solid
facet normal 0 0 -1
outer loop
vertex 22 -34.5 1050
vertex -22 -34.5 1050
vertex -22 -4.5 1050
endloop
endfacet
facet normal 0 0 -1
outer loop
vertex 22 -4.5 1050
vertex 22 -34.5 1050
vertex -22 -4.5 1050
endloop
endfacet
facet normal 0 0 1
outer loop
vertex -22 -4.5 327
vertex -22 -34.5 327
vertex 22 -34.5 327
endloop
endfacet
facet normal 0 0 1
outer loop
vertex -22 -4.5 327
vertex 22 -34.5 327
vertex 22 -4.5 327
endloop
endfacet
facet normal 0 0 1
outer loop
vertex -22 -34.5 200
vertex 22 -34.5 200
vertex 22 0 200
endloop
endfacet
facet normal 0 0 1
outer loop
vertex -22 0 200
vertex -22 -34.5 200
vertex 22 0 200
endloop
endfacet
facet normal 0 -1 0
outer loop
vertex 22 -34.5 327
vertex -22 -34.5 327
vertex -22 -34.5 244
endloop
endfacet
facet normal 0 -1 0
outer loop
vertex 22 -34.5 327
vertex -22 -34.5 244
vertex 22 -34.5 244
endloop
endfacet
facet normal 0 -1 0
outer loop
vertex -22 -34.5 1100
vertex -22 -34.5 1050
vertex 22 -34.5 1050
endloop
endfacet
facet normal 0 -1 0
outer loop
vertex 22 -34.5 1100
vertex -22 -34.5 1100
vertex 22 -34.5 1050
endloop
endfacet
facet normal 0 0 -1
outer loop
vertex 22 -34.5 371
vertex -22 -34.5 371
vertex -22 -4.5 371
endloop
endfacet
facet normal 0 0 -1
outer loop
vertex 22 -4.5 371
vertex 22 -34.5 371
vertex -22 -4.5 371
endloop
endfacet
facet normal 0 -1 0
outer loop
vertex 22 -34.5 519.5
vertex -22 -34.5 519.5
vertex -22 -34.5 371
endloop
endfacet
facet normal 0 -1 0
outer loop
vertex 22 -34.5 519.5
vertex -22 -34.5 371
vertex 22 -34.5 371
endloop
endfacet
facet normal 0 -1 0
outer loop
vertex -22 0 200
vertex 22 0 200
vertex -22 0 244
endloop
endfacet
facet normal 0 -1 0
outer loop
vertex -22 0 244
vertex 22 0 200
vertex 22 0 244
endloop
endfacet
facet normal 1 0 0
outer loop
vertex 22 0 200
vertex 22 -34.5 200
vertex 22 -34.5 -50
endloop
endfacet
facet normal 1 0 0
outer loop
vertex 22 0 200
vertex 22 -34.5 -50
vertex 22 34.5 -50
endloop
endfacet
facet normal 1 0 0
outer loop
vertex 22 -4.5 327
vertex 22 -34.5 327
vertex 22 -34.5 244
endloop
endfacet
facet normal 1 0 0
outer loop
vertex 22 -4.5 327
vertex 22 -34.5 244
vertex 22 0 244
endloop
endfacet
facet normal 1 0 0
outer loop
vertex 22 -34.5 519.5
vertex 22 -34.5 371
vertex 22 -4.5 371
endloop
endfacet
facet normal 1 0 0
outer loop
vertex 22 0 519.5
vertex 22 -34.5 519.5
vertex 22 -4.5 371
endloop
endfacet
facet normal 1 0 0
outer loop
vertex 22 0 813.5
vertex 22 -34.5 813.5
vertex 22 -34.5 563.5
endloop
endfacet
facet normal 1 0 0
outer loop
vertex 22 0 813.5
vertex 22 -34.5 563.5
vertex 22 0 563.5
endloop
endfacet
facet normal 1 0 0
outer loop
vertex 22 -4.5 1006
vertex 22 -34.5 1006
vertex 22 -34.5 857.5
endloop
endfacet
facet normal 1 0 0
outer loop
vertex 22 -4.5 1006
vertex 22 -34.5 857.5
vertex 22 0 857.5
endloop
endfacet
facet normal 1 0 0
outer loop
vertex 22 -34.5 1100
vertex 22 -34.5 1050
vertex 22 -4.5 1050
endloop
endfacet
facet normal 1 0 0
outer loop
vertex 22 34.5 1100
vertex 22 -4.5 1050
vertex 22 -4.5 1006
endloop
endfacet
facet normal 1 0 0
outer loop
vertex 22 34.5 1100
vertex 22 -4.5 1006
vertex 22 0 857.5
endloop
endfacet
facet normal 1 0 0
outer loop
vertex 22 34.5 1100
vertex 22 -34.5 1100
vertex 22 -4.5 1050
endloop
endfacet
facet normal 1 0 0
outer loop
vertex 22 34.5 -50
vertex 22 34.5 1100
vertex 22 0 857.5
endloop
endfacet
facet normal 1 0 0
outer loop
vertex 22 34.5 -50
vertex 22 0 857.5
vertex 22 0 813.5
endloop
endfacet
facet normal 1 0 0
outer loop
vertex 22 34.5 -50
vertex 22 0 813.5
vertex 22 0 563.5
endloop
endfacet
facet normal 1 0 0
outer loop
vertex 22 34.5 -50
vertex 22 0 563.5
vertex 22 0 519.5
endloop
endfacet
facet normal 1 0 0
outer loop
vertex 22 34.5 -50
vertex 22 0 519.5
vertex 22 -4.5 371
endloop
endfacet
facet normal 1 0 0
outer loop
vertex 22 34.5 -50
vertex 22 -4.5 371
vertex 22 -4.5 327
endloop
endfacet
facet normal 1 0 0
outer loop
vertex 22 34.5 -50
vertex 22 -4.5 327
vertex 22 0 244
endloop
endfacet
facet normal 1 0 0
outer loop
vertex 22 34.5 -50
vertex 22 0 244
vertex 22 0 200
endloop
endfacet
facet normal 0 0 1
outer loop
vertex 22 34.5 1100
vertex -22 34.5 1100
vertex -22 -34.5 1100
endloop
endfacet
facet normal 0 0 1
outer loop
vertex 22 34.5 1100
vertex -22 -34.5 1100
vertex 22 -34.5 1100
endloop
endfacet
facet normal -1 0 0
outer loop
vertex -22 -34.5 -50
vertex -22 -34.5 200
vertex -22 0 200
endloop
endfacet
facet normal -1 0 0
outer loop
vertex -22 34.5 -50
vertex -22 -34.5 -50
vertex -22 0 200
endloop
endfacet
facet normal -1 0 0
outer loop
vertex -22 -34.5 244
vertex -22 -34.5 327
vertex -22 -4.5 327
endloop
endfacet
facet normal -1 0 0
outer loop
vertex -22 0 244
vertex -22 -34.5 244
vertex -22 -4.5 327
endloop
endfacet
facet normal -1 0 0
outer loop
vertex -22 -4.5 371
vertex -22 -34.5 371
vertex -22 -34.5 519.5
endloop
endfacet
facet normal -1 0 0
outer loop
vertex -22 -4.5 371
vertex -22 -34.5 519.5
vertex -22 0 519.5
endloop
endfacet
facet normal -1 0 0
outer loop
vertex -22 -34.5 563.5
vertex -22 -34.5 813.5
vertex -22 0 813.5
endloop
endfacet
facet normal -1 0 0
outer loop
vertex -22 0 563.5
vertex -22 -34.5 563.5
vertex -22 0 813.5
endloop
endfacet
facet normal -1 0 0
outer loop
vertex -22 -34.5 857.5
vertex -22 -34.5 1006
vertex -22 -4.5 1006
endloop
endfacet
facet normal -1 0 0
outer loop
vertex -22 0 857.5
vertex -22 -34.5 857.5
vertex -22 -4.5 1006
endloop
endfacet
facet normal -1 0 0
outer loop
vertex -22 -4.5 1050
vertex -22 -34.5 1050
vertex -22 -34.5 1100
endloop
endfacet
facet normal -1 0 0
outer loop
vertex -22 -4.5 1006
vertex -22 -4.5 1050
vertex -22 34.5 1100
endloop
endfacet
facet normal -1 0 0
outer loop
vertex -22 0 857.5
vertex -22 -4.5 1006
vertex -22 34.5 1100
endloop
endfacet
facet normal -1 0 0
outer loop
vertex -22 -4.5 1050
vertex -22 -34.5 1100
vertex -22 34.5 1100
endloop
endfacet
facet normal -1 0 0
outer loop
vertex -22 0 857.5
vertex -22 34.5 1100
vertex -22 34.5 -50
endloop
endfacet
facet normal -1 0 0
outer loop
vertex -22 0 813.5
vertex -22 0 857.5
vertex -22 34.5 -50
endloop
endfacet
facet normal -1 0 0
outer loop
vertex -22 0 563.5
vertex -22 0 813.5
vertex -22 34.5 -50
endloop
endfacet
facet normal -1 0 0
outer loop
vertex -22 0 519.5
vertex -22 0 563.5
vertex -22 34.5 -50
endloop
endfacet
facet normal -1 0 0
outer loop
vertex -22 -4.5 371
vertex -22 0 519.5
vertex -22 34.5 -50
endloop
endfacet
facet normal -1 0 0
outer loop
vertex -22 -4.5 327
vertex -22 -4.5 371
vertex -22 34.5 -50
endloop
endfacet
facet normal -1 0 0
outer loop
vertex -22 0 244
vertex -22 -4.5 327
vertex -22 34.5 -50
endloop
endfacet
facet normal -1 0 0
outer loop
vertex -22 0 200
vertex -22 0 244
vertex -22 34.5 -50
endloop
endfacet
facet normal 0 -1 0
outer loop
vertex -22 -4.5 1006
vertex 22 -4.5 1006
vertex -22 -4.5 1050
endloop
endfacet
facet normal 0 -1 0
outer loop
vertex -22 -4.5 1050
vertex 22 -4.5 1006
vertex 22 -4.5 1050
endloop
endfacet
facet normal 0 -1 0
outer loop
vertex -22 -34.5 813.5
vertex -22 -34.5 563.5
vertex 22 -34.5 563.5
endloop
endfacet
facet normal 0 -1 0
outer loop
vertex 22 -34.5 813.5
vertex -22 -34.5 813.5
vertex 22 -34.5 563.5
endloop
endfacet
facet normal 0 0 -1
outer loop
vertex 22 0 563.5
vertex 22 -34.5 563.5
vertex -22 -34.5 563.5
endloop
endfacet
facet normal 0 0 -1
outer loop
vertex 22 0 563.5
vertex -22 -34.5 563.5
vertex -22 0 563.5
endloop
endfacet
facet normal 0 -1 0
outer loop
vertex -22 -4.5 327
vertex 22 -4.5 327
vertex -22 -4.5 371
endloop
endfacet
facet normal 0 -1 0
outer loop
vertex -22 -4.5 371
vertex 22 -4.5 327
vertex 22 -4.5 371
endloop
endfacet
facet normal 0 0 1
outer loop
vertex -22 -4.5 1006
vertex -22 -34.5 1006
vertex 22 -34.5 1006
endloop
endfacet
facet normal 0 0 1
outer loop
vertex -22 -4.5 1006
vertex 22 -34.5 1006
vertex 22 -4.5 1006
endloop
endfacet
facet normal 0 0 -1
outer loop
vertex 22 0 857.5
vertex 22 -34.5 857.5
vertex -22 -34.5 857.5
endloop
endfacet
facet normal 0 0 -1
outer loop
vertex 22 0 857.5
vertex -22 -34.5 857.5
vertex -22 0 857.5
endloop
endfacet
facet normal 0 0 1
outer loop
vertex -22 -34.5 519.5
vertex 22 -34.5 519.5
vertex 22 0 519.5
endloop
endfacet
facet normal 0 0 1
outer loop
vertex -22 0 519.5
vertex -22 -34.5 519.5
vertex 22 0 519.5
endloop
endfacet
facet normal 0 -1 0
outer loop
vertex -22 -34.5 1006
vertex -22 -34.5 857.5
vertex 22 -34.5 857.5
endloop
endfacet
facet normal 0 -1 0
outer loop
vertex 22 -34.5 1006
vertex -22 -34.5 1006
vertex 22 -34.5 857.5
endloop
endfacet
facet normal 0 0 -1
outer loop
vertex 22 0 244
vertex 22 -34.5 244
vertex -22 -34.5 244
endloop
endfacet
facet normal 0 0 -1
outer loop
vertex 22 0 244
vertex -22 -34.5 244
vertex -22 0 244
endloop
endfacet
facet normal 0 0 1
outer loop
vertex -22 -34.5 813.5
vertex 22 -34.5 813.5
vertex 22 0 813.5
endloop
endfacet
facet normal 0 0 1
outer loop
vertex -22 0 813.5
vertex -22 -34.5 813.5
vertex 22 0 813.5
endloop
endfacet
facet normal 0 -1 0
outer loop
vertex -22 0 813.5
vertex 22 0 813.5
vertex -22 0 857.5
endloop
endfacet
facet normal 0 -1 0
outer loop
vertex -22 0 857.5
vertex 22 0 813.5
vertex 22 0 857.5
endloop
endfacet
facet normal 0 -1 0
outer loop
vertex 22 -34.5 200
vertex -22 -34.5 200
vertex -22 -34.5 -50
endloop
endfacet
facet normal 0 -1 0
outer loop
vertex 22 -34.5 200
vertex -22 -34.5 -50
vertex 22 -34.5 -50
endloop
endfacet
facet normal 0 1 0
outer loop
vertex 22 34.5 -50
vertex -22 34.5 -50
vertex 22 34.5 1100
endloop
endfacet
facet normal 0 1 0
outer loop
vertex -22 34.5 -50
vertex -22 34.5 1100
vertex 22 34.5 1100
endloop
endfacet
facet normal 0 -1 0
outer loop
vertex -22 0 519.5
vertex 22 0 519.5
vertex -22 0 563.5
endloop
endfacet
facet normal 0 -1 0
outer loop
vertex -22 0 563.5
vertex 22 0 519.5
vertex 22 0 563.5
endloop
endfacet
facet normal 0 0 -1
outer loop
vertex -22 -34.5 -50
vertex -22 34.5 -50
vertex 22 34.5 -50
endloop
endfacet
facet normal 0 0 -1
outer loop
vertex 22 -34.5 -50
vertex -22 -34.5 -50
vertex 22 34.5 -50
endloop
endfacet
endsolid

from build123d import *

# Parameters (mm, degrees)
F0_W     = 44
F0_H     = 69
F1_DEPTH = 1100
F2_W     = 30
F2_H     = 44
F3_DEPTH = 44.001
F4_W     = 34.5
F4_H     = 44
F5_DEPTH = 44.001
F6_DEPTH = 50
F7_W     = 34.5
F7_H     = 44
F8_DEPTH = 133


with BuildPart() as f1:
    # F0 (on Top) → F1 (new body)
    with BuildSketch(Plane.XY):
        Rectangle(F0_W, F0_H)
    extrude(amount=F1_DEPTH)

    # F2 (on face) → F3 (cut, through all)
    with BuildSketch(Plane.YZ.offset(22)):
        with Locations((-19.5, 1028)):
            Rectangle(F2_W, F2_H)
        with Locations((-19.5, 349)):
            Rectangle(F2_W, F2_H)
    extrude(amount=-F3_DEPTH, mode=Mode.SUBTRACT)

    # F4 (on face) → F5 (cut, through all)
    with BuildSketch(Plane.YZ.offset(22)):
        with Locations((-17.25, 835.5)):
            Rectangle(F4_W, F4_H)
        with Locations((-17.25, 541.5)):
            Rectangle(F4_W, F4_H)
    extrude(amount=-F5_DEPTH, mode=Mode.SUBTRACT)

    # F6 (add): a face of the model
    f6_faces = [f1.faces().sort_by_distance(p)[0] for p in [
        (0, 0, 0),
    ]]
    extrude(f6_faces, amount=F6_DEPTH)

    # F7 (on face) → F8 (cut)
    with BuildSketch(Plane.YZ.offset(22)):
        with Locations((-17.25, 222)):
            Rectangle(F7_W, F7_H)
    extrude(amount=-F8_DEPTH, mode=Mode.SUBTRACT)


solid = f1.part
